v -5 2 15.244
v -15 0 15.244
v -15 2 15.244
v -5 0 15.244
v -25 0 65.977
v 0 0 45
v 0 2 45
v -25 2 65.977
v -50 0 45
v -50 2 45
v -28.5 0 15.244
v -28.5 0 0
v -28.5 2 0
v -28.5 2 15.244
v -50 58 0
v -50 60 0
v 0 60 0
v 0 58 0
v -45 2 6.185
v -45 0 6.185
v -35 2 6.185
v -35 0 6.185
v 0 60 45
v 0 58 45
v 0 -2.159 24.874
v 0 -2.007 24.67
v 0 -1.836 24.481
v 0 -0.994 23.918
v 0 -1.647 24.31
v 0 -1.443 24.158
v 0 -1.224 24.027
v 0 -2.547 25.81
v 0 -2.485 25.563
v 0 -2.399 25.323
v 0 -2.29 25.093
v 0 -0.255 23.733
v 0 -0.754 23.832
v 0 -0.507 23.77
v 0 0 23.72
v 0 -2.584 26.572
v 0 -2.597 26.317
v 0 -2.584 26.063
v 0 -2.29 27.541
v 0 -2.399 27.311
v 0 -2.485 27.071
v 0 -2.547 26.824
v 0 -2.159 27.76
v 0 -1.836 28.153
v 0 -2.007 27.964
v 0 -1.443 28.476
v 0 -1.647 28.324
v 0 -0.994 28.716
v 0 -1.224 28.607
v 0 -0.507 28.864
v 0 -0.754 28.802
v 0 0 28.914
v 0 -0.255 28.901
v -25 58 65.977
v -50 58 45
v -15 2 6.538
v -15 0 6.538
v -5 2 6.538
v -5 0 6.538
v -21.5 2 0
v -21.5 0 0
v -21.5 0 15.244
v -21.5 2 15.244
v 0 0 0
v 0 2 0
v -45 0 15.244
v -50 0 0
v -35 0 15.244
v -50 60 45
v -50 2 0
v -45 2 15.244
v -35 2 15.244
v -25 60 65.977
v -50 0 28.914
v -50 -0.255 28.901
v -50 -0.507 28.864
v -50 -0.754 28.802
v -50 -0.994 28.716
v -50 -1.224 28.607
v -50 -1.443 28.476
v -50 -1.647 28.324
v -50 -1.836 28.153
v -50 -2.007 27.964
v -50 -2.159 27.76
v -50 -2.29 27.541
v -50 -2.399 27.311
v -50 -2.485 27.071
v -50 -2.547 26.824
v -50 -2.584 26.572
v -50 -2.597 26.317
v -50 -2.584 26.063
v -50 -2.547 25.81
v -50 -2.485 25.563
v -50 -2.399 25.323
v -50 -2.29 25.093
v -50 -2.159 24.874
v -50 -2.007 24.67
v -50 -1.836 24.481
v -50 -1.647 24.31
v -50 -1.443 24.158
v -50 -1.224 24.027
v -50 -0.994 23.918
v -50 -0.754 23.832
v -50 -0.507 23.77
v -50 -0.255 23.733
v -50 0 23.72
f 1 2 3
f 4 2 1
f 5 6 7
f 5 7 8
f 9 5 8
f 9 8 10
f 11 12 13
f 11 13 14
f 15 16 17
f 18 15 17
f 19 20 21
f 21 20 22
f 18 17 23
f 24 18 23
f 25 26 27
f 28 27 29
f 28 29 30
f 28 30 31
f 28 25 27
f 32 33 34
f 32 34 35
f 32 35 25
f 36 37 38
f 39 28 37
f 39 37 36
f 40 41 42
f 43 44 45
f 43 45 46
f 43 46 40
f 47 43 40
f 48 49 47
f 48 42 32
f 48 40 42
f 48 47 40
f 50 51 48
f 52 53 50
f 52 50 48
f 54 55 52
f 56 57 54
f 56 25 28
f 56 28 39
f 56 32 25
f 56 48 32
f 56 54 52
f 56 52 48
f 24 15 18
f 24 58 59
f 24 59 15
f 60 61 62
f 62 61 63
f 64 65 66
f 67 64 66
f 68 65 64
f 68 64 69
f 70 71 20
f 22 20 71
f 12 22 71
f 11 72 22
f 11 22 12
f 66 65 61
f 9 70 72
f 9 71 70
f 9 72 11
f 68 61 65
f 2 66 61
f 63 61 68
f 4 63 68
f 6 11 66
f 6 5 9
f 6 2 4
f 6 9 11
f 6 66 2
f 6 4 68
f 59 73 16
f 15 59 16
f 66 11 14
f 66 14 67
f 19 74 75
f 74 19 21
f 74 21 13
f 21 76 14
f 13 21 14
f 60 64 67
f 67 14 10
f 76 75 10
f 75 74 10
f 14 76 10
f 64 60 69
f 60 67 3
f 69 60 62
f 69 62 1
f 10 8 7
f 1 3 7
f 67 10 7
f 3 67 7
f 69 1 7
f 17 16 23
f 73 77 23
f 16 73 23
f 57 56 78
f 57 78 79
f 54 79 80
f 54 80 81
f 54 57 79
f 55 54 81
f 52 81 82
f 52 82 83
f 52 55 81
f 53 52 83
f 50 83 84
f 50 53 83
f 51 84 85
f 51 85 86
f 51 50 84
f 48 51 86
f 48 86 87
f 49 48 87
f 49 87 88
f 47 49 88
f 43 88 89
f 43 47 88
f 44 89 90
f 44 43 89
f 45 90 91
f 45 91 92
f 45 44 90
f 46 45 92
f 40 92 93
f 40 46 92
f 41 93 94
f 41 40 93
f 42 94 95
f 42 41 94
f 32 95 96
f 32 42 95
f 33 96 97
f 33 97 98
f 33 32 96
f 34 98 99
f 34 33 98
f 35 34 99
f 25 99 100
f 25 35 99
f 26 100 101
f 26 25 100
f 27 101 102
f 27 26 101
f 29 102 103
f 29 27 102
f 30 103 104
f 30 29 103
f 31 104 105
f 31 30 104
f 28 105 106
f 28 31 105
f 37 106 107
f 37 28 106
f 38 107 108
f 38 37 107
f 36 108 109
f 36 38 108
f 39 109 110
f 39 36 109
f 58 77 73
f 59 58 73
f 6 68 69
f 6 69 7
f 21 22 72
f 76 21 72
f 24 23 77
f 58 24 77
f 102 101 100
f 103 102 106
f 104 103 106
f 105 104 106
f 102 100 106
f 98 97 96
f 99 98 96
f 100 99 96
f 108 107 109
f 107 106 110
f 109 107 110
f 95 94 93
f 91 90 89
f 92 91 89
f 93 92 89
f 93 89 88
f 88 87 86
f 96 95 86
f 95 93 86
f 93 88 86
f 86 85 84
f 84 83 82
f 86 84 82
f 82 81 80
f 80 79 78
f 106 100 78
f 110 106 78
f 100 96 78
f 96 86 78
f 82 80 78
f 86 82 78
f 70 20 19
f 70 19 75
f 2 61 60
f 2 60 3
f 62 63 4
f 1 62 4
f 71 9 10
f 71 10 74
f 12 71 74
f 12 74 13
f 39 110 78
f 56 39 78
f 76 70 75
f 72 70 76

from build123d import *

# Parameters (mm, degrees)
F6_DEPTH  = 2
F7_DEPTH  = 2
F8_W      = 10
F8_H      = 9.058821
F8_W_2    = 7
F8_H_2    = 15.243576
F8_H_3    = 8.705881
F9_DEPTH  = 25
F11_DEPTH = 50


with BuildPart() as f6:
    # F1 (on Front) → F6 (new body, through all)
    with BuildSketch(Plane.XZ):
        Polygon((-50, 0), (0, 0), (0, 45), (-25, 65.977491), (-50, 45), align=None)
    extrude(amount=-F6_DEPTH)

    # F8 (on Front) → F9 (cut)
    with BuildSketch(Plane.XZ):
        with Locations((-40, 10.714166)):
            Rectangle(F8_W, F8_H)
        with Locations((-25, 7.621788)):
            Rectangle(F8_W_2, F8_H_2)
        with Locations((-10, 10.890635)):
            Rectangle(F8_W, F8_H_3)
    extrude(amount=-F9_DEPTH, mode=Mode.SUBTRACT)


with BuildPart() as f7:
    # F5 (on plane+point) → F7 (new body, through all)
    with BuildSketch(Plane.XZ.offset(-60)):
        Polygon((-50, 0), (0, 0), (0, 45), (-25, 65.977491), (-50, 45), align=None)
    extrude(amount=F7_DEPTH)


with BuildPart() as f11:
    # F10 (on Right) → F11 (new body, through all)
    with BuildSketch(Plane.YZ):
        with BuildLine():
            Line((0, 23.720346), (0, 28.913788))
            ThreePointArc((0, 28.913788), (-2.596721, 26.317067), (0, 23.720346))
        make_face()
    extrude(amount=-F11_DEPTH)


solid = Compound([f6.part, f7.part, f11.part])
